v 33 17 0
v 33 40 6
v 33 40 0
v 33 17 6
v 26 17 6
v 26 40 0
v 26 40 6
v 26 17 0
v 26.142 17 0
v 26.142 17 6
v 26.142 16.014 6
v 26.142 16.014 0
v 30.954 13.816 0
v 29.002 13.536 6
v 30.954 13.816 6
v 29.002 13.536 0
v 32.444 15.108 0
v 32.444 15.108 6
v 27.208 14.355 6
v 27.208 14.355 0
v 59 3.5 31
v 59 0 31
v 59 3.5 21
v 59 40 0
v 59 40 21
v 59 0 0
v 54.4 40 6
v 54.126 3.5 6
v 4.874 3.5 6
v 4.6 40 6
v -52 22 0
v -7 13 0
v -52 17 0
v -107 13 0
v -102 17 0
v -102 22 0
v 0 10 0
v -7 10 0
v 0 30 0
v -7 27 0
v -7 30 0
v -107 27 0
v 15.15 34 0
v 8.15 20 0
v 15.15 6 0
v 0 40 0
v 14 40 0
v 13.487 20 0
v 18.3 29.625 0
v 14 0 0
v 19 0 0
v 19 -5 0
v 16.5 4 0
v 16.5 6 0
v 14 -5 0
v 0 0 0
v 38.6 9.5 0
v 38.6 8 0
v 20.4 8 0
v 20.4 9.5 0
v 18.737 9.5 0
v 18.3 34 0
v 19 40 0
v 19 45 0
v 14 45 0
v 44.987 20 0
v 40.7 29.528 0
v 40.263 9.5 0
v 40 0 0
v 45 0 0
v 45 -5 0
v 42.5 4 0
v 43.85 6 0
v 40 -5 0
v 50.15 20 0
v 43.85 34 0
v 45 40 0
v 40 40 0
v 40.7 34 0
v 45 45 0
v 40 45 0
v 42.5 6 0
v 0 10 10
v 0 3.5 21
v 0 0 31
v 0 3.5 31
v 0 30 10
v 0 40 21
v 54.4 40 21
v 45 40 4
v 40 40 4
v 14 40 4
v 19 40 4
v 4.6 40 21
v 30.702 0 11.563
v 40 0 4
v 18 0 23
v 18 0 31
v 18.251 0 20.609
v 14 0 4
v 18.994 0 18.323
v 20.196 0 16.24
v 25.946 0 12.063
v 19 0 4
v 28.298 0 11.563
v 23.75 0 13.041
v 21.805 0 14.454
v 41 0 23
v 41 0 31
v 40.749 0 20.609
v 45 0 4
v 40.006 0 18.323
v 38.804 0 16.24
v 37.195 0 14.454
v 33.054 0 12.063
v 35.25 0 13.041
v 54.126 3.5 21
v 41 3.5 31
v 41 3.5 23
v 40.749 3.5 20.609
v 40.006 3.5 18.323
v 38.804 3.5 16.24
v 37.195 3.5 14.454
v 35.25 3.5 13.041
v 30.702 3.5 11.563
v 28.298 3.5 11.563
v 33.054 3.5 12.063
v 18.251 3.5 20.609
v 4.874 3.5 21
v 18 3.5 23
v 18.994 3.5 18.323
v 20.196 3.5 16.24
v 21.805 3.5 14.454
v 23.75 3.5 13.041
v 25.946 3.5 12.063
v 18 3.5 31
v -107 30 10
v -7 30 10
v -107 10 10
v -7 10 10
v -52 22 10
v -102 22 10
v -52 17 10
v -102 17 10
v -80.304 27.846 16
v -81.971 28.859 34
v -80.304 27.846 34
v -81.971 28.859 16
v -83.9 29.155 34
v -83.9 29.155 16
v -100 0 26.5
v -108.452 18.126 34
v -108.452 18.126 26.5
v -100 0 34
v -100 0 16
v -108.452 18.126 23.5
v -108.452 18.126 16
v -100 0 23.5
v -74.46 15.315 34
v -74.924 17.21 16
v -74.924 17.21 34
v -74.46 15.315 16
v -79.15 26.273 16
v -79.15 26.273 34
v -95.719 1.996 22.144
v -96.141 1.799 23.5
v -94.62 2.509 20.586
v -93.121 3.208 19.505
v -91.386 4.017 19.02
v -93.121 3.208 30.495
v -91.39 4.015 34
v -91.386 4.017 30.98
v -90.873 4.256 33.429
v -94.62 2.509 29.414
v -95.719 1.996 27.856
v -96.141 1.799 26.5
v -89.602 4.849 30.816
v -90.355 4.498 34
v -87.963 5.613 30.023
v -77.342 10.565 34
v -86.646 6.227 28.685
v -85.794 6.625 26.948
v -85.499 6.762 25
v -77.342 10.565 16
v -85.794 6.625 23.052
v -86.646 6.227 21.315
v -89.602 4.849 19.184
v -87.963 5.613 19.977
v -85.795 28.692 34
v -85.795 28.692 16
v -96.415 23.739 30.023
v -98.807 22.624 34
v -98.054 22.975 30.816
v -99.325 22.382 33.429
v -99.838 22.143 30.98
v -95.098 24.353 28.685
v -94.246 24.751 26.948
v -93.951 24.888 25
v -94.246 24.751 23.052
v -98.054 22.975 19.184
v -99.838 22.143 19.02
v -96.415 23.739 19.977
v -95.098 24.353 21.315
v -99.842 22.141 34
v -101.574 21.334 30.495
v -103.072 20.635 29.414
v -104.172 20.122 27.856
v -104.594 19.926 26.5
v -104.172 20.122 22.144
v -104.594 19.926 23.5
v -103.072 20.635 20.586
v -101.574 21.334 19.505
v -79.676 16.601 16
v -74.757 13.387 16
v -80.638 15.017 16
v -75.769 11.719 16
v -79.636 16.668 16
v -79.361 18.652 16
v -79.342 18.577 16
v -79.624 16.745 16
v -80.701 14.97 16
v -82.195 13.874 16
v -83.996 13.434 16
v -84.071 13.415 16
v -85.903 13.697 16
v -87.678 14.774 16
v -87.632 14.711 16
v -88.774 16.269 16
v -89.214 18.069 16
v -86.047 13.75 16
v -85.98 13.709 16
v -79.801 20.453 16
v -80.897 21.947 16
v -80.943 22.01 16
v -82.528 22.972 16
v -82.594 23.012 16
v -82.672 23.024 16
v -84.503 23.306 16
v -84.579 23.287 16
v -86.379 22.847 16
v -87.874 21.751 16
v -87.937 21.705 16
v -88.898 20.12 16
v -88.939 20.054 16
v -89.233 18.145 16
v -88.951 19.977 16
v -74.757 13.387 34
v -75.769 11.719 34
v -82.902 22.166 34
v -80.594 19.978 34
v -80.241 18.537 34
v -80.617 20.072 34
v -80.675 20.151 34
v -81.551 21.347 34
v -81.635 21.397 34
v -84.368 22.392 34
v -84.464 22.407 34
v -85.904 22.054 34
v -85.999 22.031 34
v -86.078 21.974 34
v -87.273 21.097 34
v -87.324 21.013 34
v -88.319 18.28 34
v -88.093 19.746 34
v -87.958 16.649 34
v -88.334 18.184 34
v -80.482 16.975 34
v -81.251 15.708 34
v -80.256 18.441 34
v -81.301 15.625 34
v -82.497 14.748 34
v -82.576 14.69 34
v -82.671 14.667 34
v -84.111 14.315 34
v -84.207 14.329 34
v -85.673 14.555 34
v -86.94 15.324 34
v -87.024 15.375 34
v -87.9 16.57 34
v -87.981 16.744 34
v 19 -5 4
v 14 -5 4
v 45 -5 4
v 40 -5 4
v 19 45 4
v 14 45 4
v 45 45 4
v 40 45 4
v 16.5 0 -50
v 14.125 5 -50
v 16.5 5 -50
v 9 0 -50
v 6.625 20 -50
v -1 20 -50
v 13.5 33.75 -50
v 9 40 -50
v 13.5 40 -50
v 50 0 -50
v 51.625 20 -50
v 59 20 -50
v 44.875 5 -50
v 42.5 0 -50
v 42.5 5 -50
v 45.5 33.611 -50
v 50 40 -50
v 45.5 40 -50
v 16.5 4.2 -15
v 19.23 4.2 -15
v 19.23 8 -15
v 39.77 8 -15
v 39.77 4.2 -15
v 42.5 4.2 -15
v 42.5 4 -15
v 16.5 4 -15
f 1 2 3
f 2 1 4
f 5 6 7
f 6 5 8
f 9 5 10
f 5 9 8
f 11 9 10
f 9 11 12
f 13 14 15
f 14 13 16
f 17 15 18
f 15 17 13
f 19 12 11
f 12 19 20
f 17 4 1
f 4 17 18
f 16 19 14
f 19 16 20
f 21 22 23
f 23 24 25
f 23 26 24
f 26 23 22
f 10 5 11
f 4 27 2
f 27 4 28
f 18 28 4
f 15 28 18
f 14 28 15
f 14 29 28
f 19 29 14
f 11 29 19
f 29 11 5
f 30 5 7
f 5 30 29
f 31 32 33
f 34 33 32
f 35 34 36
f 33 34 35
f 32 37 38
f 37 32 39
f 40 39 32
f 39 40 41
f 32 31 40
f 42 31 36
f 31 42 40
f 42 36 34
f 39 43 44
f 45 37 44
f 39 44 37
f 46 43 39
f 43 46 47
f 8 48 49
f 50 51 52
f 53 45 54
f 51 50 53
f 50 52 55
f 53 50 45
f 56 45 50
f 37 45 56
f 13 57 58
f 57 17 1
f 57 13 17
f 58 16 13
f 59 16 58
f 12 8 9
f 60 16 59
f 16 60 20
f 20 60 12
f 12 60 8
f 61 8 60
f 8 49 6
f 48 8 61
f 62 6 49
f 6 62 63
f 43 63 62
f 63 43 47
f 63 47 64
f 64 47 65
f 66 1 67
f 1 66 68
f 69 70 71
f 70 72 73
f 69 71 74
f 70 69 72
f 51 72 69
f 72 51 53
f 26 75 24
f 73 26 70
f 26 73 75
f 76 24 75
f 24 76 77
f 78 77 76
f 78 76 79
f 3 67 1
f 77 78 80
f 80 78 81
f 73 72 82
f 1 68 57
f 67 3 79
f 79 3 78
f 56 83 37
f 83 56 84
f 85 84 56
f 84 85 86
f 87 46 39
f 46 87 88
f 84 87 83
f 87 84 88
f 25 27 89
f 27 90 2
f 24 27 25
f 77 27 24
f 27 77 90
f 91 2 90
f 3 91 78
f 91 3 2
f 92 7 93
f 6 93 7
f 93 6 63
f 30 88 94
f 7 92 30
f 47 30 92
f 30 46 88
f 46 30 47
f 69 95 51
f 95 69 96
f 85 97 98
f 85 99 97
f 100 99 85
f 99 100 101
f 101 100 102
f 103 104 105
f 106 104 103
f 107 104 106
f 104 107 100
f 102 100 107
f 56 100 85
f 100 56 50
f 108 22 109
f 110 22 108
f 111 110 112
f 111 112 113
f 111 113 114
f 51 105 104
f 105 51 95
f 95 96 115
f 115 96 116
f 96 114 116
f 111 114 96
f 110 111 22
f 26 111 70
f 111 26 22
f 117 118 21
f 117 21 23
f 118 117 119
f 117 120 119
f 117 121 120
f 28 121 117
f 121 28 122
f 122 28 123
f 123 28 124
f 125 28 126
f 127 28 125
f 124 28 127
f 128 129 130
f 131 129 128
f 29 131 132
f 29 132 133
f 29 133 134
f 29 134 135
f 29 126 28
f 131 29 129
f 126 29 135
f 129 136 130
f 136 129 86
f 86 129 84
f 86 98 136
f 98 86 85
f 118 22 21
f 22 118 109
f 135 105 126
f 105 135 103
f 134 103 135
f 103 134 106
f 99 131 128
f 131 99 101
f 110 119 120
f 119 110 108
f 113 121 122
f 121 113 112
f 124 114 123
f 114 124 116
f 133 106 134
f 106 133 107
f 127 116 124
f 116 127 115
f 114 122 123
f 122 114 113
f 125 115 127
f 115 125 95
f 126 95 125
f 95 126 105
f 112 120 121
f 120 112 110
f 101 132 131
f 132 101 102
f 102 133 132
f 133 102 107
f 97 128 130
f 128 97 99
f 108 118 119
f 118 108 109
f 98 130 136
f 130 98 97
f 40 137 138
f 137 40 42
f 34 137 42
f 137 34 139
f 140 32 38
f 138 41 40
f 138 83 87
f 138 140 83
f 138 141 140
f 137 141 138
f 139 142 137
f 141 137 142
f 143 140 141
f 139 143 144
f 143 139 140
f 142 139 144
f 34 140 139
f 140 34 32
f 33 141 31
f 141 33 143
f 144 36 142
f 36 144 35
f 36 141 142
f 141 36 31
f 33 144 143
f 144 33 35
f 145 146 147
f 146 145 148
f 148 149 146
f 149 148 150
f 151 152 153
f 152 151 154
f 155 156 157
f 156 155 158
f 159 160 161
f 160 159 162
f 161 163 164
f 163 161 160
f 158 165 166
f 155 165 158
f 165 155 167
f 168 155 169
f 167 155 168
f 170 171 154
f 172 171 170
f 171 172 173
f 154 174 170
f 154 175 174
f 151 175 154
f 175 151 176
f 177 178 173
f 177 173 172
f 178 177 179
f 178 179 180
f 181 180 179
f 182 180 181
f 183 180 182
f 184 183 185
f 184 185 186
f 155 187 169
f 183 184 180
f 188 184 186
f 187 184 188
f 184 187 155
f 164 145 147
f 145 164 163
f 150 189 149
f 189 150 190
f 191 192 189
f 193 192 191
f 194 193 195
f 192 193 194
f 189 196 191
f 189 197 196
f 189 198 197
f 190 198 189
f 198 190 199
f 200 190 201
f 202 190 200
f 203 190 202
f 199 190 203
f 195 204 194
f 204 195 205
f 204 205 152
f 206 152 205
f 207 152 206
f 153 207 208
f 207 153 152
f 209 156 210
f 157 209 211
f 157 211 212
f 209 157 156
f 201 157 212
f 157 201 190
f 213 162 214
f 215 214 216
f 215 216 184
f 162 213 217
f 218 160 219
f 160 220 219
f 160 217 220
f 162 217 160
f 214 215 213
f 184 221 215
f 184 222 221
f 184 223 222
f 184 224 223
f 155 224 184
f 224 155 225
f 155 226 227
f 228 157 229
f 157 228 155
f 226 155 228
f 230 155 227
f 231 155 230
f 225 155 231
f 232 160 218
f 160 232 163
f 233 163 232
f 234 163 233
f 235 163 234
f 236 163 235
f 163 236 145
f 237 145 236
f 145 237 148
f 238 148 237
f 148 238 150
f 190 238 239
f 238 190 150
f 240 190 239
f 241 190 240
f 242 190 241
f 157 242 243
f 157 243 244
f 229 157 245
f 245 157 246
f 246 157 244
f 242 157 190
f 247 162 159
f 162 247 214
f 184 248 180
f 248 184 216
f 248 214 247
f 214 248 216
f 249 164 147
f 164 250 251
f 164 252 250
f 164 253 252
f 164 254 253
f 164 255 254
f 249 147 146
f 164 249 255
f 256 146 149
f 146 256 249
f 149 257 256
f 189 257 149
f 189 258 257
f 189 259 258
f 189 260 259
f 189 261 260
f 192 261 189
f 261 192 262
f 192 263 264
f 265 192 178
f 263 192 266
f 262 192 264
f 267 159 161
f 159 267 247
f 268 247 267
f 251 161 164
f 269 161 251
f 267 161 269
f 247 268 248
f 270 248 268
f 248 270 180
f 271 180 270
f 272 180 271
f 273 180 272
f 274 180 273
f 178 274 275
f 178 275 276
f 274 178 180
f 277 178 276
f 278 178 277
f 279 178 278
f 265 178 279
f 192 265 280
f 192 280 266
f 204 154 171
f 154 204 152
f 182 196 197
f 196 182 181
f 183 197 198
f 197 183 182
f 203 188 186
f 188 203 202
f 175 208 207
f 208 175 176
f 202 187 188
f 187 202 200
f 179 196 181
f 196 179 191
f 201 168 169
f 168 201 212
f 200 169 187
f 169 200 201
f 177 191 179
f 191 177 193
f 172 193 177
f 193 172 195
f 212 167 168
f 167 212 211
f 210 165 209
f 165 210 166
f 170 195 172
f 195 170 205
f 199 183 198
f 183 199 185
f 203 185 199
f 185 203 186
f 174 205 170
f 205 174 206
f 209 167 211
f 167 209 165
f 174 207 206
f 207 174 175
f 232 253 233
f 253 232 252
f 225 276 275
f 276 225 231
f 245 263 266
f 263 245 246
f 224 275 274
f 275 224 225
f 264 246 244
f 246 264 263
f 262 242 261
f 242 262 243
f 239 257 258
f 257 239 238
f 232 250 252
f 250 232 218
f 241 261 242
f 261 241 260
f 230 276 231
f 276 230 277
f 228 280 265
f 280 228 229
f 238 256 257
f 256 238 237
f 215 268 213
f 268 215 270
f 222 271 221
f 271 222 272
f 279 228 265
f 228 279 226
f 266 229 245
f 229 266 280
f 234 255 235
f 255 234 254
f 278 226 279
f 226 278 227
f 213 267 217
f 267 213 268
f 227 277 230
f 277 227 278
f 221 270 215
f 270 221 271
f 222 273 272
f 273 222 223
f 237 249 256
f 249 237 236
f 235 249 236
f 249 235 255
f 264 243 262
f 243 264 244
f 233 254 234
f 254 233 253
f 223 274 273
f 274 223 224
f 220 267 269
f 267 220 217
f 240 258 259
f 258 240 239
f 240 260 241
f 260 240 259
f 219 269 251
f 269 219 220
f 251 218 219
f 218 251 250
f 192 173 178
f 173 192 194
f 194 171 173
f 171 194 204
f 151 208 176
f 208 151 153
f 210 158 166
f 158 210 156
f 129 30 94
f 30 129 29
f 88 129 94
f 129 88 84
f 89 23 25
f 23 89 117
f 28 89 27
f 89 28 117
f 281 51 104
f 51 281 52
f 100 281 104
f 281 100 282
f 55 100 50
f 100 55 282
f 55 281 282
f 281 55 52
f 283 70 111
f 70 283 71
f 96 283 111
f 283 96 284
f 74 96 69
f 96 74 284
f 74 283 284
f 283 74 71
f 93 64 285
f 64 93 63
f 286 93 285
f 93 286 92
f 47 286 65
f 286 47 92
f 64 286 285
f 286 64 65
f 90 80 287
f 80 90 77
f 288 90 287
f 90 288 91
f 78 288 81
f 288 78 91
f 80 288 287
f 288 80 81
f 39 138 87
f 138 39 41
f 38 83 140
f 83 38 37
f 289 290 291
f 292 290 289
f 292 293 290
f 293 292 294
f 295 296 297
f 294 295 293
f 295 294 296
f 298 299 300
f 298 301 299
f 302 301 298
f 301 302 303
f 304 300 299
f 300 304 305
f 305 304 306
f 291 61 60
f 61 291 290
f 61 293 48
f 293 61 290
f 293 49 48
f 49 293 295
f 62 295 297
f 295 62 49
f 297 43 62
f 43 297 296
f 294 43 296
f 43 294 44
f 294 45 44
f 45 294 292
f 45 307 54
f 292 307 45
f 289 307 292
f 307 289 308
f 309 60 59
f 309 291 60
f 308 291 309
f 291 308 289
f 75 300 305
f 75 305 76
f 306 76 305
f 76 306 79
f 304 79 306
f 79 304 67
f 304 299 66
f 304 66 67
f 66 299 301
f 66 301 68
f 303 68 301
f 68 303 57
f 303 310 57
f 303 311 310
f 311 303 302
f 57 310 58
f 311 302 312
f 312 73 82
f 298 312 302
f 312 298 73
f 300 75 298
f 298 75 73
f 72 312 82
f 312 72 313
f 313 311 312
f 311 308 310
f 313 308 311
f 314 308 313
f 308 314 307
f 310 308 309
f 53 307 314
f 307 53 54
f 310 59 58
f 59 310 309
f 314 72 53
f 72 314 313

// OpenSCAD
// camera
*translate([5,5,6]) cube([49,26,35.5]);
//*****************************************************************
//baseplate
difference(){
	cube([59,40,6]);
	color("green")translate([26,17,-1]){
		cube([7,26,8]);
		translate([3.5,0,0])cylinder(8,3.5,3.5);
	}
}
//front wall
difference(){
	union(){
		color("green")translate([0,0,6])cube([59,3.5,5]);
		translate([0,0,11])cube([59,3.5,20]);
	}
	color("red") translate([29.5,4,23]) rotate([90,0,0])cylinder(5,11.5,11.5);
	color("blue") translate([18,-1,23])cube([23,5,20]);
}
//left wall
color("red")translate([0,0,6]){
	linear_extrude(height=15, center=false, convexity=14, twist=0)
	polygon( [ [0,0],[0,40],[4.6,40],[4.9,0] ] );
}
//right wall
color("red")translate([59,0,6]){
	linear_extrude(height=15, center=false, convexity=14, twist=0)
	polygon( [ [0,0],[0,40],[-4.6,40],[-4.9,0] ] );
}

//elastics mounting points
translate([14,-5,])cube([5,5,4]);
translate([40,-5,])cube([5,5,4]);
translate([14,40,])cube([5,5,4]);
translate([40,40,])cube([5,5,4]);


//arm mounting point
translate([-7,10,0])cube([7,20,5]);


//**********************************************

//laser arm
paths = [[0,0],[3,10],[17,10],[20,0]];
translate([-7,5,0]){
	difference(){
		color("green") translate([-50,25,10]) rotate([90,180,90]){
			linear_extrude(height = 100, center = true, convexity = 14, twist = 0) 
			polygon(paths);
		}
		color("blue") translate([-95,12,-5]) cube([50,5,17]);
		*color("purple") translate([0,3,7.5])rotate([0,-86,0]) cube([5,25,40]);
	}
}
color("lime")translate([-7,10,5])cube([7,20,5]);


//******************************************************************
// laser holder
translate([-100,0,25])rotate([0,0,25])difference(){
	linear_extrude(height = 18, center = true, convexity = 14, twist = 0)hull(){
		square([10,20]);
		translate([25,5,0]) circle(5);
		translate([25,15,0]) circle(5);
	}
	translate([10,25,0])rotate([90,0,0])cylinder(30,6,6);
	translate([22,10,-10]) cylinder(20,5,4);
	color("red")translate([3,-5,15.5]) rotate([0,45,0]) cube([10,30,10]);
	color("red")translate([0,-1,-1.5])cube([5,22,3]);
}

//*******************************************************************
scale_factor = 0.7;
path_base_pillar =[[-20.5,-20],[20.5,-20],[29.5,0],[20.5,20],[-20.5,20],[-30.5,0]];
translate([29.5,20,-50])linear_extrude(height = 50, center = false, convexity = 10, scale=scale_factor)
difference(){
	color("red") polygon(path_base_pillar);
	polygon(path_base_pillar*0.75);
	color("green")translate([0,18,0])square([32,10],true);
	color("green")translate([0,-18,0])square([26,10],true);
}
translate([29.5,20,-50])color("purple")translate([-13,-16,35])cube([26,4,15]);
